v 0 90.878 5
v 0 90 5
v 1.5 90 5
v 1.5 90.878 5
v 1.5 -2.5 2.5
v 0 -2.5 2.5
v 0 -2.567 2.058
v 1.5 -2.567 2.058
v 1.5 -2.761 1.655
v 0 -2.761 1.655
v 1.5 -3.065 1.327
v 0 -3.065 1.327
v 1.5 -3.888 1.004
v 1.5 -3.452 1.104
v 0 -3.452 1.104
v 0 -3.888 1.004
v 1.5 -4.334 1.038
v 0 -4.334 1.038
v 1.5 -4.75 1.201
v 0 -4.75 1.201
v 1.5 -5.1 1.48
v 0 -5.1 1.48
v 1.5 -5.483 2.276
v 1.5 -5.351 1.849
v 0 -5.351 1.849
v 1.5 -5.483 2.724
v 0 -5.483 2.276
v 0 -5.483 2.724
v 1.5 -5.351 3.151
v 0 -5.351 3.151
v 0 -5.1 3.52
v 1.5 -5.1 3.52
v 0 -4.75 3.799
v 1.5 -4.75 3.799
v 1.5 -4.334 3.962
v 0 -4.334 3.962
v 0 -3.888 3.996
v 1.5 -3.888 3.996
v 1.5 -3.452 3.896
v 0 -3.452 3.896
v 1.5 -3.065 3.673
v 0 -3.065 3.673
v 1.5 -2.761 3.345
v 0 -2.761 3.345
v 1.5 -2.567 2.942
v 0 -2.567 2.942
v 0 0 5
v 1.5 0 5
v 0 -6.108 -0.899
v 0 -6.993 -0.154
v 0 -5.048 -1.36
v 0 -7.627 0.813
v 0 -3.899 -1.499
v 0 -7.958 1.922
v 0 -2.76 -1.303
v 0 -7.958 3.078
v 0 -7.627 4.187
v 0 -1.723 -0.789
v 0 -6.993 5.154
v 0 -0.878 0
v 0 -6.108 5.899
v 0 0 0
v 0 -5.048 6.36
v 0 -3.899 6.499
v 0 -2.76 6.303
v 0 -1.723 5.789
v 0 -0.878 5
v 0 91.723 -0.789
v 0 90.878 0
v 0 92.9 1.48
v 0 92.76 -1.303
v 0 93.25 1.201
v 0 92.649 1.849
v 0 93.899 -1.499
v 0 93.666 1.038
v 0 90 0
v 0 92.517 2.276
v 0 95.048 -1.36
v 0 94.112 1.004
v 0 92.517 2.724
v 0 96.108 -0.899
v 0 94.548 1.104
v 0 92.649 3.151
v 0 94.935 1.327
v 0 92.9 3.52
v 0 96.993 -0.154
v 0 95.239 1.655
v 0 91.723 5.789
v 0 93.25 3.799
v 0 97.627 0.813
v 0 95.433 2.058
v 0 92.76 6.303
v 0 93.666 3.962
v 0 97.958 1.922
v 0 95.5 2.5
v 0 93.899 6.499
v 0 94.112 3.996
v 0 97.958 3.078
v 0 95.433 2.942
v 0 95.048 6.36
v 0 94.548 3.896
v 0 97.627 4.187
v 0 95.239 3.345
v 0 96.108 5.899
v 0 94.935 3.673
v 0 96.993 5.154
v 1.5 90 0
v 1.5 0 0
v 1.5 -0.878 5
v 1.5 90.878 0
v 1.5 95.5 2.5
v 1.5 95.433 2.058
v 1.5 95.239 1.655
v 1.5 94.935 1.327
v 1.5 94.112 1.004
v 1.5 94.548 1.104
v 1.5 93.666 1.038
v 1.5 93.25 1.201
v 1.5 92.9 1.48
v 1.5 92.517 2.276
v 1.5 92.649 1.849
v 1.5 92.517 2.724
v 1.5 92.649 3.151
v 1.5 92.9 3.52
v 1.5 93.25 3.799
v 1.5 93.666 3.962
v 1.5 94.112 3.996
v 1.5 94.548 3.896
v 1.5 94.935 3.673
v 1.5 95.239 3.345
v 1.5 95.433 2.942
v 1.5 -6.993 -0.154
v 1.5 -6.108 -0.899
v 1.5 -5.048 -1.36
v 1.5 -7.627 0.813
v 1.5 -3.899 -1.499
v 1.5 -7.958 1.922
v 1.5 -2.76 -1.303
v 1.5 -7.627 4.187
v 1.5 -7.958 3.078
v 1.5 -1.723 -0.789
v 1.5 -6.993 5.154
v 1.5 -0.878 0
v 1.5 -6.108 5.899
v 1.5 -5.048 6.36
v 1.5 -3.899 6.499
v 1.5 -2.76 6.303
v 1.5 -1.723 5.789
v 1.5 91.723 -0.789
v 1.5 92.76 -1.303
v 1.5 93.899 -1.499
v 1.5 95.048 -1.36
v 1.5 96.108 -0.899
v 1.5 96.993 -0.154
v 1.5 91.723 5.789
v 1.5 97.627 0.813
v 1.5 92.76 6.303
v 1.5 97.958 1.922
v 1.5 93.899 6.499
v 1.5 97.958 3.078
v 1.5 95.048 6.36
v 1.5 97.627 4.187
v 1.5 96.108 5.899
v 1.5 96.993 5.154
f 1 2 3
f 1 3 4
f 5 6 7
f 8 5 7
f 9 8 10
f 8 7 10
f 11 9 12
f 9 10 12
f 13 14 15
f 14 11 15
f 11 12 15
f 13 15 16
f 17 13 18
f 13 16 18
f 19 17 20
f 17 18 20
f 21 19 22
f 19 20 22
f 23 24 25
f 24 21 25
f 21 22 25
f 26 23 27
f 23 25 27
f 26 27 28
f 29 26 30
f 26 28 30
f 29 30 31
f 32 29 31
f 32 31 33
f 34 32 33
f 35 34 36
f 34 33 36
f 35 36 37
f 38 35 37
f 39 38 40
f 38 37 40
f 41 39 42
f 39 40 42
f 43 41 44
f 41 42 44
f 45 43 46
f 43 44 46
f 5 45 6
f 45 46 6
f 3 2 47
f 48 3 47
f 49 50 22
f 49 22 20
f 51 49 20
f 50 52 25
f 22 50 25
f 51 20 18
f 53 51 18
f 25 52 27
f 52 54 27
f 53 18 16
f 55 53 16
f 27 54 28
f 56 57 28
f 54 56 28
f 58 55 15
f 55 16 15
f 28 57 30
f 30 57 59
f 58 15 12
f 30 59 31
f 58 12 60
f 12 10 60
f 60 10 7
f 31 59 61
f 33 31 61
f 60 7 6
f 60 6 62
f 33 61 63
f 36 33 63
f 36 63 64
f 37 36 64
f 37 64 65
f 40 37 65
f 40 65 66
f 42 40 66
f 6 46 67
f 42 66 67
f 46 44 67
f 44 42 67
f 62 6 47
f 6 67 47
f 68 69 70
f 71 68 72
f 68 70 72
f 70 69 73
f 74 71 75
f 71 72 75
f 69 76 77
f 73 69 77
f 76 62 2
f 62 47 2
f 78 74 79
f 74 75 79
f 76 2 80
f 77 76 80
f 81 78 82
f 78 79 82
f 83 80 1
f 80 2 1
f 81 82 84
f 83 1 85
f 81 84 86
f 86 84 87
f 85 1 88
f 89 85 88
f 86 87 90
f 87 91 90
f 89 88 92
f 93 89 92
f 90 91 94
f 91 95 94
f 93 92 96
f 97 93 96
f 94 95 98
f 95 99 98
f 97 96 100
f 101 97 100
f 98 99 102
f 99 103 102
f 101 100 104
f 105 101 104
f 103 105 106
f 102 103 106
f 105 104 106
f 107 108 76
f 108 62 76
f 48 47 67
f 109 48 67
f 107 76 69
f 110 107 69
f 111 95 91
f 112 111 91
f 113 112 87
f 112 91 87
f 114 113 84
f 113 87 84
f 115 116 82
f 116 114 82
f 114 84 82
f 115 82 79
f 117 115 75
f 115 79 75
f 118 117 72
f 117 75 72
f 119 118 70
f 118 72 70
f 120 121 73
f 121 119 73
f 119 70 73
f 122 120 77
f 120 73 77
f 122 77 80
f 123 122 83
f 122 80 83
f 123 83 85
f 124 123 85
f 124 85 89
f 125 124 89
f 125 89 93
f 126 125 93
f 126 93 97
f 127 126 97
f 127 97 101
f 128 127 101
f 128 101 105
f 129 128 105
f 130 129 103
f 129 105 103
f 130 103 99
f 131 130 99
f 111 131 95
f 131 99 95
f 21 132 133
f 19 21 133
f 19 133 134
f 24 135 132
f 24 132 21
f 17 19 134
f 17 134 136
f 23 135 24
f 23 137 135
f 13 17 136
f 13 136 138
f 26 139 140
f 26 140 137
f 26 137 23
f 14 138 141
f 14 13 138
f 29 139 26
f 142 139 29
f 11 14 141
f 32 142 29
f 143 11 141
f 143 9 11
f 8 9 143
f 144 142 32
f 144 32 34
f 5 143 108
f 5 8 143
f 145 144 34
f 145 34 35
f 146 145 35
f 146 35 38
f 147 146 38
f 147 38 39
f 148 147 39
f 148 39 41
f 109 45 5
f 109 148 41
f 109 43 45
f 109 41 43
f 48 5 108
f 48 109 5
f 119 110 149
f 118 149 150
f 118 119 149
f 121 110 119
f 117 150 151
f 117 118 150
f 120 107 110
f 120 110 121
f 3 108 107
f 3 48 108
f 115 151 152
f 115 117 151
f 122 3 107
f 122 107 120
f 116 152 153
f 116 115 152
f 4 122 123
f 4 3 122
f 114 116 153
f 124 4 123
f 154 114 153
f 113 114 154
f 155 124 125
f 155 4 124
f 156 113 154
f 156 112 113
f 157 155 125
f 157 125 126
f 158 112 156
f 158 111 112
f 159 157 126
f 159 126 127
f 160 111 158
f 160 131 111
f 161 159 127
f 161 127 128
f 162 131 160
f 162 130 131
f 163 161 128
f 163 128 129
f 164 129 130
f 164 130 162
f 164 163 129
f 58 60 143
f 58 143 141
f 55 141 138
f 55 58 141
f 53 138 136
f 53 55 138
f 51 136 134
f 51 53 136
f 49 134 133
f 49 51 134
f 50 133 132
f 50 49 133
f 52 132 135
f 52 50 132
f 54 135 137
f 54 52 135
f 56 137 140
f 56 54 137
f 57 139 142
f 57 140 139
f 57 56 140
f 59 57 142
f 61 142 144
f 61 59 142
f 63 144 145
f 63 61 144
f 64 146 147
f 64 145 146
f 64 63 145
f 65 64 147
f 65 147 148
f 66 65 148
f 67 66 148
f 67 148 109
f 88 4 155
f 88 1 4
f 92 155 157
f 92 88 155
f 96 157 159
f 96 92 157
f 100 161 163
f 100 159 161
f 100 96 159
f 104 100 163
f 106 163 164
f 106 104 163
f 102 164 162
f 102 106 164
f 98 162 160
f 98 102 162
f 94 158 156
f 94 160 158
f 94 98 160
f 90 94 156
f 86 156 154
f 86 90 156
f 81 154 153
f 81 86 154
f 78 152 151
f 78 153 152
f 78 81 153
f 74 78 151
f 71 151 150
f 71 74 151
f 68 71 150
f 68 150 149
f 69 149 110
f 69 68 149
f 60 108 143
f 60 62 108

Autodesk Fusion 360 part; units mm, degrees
sketch "Boceto1" plane through (0, 0, 0) normal (1, 0, 0) x (0, 1, 0)
  line L0 (0, 0) -> (90, 0)
  line L1 (90, 5) -> (0, 5)
  line L2 (0, 5) -> (-0.8775, 5)
  line L3 (90, 5) -> (90.8775, 5)
  line L4 (0, 0) -> (-2, 0)
  line L5 (90, 0) -> (91.5, 0)
  circle A0 centre (94, 2.5) radius 1.5
  circle A1 centre (-4, 2.5) radius 1.5
  arc A2 (-0.8775, 5) -> (-0.8775, 0) centre (-4, 2.5) ccw
  arc A3 (90.8775, 0) -> (90.8775, 5) centre (94, 2.5) ccw
  dimension "d1" = 90
  dimension "d2" = 5
  dimension "d4" = 3
  dimension "d5" = 3
extrude "Extruir1" add sketch "Boceto1" along normal blind 1.5
sketch "Boceto2" plane through (1.5, 0, 0) normal (1, 0, 0) x (0, 1, 0)
  circle A0 centre (94, 2.5) radius 1.5
  circle A1 centre (-4, 2.5) radius 1.5
  line L0 (-0.8775, 0) -> (90.8775, 0)
  arc A2 (90.8775, 0) -> (90.8775, 5) centre (94, 2.5) ccw
  line L1 (90.8775, 5) -> (-0.8775, 5)
  arc A3 (-0.8775, 5) -> (-0.8775, 0) centre (-4, 2.5) ccw
